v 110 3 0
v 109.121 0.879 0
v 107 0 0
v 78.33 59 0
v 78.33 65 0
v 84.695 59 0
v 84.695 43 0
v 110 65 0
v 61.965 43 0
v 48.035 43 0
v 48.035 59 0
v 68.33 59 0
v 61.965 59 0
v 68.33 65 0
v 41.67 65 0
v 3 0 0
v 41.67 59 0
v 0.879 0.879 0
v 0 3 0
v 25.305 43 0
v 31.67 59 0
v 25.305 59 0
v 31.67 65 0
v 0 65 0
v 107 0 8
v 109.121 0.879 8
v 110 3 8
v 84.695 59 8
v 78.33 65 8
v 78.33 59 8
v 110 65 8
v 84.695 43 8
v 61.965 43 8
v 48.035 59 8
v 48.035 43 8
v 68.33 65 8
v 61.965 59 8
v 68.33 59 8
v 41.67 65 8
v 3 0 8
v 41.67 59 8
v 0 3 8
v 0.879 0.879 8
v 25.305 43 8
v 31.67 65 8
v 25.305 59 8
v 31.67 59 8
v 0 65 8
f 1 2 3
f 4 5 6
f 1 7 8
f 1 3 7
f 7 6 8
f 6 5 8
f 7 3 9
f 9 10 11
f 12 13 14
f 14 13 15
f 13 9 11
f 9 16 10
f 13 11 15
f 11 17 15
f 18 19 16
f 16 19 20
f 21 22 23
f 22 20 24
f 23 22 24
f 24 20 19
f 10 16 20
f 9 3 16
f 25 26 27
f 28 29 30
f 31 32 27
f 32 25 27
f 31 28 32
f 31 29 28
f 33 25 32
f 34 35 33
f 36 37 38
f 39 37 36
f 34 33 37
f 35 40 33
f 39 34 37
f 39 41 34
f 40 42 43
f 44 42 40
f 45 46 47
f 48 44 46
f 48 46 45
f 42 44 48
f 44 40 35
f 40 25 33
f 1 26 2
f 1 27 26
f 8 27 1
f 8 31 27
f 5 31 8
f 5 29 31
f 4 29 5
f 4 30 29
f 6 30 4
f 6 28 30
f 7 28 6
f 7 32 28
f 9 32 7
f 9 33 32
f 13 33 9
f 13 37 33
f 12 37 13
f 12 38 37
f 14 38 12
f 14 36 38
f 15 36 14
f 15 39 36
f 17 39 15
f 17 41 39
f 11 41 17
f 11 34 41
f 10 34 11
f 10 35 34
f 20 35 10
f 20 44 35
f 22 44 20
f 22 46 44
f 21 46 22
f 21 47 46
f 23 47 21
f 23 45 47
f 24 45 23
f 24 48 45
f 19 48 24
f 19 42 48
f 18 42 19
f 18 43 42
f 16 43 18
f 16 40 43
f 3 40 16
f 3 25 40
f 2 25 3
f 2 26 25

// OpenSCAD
$fn = 32;

// ----------------------------------------------------------------------
// Window plate: 110 x 65 mm, 2 open windows
// ----------------------------------------------------------------------

// --- parameters (mm) ---
profile_height = 8;       // extrusion height
profile_points = 24;      // points of the closed outline

profile = [[0, 3], [0.879, 0.879], [3, 0], [107, 0], [109.121, 0.879], [110, 3], [110, 65], [78.33, 65], [78.33, 59], [84.695, 59], [84.695, 43], [61.965, 43], [61.965, 59], [68.33, 59], [68.33, 65], [41.67, 65], [41.67, 59], [48.035, 59], [48.035, 43], [25.305, 43], [25.305, 59], [31.67, 59], [31.67, 65], [0, 65]];  // single closed polygon, 24 points, counter clockwise

// --- the one profile operation ---
linear_extrude(height = profile_height) polygon(points = profile);
